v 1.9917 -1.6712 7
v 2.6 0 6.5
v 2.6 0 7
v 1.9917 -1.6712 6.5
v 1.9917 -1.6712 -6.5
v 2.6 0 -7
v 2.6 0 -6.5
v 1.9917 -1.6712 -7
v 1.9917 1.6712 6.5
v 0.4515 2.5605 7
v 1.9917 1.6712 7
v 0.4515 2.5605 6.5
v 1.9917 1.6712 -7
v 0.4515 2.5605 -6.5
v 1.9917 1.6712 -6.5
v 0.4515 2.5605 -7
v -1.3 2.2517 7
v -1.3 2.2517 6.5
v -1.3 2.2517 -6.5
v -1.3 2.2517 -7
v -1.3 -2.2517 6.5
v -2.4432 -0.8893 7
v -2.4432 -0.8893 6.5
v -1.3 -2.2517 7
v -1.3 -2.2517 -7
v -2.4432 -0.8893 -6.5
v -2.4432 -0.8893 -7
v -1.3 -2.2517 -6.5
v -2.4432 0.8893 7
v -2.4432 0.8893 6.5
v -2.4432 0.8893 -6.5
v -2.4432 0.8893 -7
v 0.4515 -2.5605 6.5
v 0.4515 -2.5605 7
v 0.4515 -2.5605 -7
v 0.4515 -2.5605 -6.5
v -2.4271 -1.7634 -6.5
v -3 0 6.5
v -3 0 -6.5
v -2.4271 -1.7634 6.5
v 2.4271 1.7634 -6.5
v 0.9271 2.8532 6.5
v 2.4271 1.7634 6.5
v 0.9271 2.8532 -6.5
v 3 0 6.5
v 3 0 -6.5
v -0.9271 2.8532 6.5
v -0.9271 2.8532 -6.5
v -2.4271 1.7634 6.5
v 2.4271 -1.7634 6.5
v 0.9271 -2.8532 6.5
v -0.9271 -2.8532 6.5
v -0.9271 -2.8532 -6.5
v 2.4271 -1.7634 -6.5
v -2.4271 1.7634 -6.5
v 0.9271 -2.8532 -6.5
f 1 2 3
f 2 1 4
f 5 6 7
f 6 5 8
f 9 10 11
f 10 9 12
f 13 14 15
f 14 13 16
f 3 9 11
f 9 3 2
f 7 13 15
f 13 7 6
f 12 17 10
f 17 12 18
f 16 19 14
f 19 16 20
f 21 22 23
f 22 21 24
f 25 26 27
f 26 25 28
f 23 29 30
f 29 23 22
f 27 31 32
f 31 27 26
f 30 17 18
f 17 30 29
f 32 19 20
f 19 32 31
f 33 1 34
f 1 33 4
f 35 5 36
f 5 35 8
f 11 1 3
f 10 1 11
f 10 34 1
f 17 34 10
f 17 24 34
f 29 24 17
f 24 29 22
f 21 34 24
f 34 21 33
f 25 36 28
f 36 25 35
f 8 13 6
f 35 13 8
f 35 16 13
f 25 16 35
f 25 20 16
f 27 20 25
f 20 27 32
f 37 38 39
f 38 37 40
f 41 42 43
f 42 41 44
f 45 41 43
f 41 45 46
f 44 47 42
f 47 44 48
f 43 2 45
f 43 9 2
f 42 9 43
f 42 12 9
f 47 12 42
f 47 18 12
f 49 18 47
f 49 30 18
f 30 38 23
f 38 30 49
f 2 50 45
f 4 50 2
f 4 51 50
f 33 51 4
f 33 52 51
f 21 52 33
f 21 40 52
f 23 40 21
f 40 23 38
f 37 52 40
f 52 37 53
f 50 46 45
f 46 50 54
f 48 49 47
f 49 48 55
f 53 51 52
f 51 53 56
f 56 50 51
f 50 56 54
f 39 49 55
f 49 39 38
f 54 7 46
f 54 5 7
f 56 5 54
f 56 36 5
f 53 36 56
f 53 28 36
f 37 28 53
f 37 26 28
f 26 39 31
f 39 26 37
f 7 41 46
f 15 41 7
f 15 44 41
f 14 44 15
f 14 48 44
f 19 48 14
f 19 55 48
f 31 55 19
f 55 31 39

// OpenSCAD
// Parameters
thread_diameter_mm = 3.0; //[2.0:6.0:0.1]
length_mm = 13.0; //[6.0:26.0:0.5]
outer_diameter_mm = 6.0; //[4.0:12.0:0.5]
thread_length_top_mm = 6.0; //[0.0:13.0:0.5]
thread_length_bottom_mm = 6.0; //[0.0:13.0:0.5]
thread_feature_radial_depth_mm = 0.4; //[0.1:1.0:0.1]
overlap_mm = 1.0; //[0.5:2.0:0.1]
chamfer_height_mm = 0.8; //[0.0:2.0:0.1]
chamfer_radial_mm = 0.6; //[0.0:2.0:0.1]

// Standoff - complete geometry
module standoff() {
  color([0.85, 0.85, 0.8]) {
    // Pillar body
    cylinder(r=outer_diameter_mm/2, h=length_mm, center=true);

    // Thread features
    union() {
      translate([0, 0, length_mm/2 - thread_length_top_mm/2])
        cylinder(r=max(thread_diameter_mm/2, outer_diameter_mm/2 - thread_feature_radial_depth_mm), 
                 h=thread_length_top_mm + overlap_mm, center=true);
      translate([0, 0, -length_mm/2 + thread_length_bottom_mm/2])
        cylinder(r=max(thread_diameter_mm/2, outer_diameter_mm/2 - thread_feature_radial_depth_mm), 
                 h=thread_length_bottom_mm + overlap_mm, center=true);
    }
  }
}

// Pillar - complete geometry
module pillar() {
  color([0.85, 0.85, 0.8]) {
    // Chamfered ends
    difference() {
      cylinder(r=outer_diameter_mm/2, h=length_mm, center=true);
      scale([(outer_diameter_mm - 2*chamfer_radial_mm)/outer_diameter_mm, 
             (outer_diameter_mm - 2*chamfer_radial_mm)/outer_diameter_mm, 1]) {
        translate([0, 0, length_mm/2 - chamfer_height_mm/2])
          cylinder(r1=outer_diameter_mm/2, r2=0, h=chamfer_height_mm, center=true);
        translate([0, 0, -length_mm/2 + chamfer_height_mm/2])
          cylinder(r1=outer_diameter_mm/2, r2=0, h=chamfer_height_mm, center=true);
      }
    }
  }
}

// Assembly
module assembly() {
  standoff();
  pillar();
}

assembly();
